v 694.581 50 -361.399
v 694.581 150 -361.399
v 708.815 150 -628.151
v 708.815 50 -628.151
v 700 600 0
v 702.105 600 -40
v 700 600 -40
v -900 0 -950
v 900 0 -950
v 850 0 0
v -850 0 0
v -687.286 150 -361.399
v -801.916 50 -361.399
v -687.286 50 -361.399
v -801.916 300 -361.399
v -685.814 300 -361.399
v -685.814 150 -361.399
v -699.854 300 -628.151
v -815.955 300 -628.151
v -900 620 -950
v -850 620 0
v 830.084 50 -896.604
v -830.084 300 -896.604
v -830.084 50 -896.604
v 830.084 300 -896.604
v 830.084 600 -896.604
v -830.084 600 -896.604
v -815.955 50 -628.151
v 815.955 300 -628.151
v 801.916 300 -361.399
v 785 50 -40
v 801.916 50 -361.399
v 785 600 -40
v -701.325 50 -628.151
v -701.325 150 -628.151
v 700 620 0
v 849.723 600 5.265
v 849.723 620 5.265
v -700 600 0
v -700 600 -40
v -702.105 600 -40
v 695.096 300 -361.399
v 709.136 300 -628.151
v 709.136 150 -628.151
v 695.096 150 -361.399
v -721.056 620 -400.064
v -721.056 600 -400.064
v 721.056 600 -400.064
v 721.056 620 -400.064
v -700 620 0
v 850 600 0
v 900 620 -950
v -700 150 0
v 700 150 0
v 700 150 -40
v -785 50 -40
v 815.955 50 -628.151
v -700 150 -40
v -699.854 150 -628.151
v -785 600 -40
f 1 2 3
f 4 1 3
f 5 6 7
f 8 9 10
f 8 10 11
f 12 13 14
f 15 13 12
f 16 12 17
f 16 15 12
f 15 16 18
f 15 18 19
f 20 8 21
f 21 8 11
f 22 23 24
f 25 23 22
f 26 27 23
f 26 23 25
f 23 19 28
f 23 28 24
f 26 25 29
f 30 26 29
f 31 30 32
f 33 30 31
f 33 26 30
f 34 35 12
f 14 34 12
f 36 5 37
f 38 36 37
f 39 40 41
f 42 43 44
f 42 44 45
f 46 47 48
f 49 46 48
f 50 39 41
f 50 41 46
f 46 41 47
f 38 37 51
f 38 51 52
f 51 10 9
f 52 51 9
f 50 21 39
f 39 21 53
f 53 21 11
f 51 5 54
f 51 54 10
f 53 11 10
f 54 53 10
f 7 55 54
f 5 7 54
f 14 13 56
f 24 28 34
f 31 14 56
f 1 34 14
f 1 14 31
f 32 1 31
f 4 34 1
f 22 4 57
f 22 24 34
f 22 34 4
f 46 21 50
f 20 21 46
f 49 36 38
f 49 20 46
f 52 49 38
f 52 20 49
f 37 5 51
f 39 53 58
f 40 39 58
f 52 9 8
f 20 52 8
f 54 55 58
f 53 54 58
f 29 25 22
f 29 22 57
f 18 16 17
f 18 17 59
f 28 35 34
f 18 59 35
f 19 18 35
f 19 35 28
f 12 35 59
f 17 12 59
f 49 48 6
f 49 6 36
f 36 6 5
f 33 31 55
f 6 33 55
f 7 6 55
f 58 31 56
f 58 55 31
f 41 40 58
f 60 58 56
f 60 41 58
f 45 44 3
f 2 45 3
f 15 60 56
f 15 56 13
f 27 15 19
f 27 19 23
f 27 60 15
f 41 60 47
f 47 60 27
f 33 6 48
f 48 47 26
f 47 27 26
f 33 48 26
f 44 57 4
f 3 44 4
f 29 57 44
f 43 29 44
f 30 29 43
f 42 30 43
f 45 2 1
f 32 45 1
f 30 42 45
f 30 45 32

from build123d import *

# Parameters (mm, degrees)
EXTRUDE_1_DEPTH          = 600
CUT_EXTRUDE_1_DEPTH      = 300
CUT_EXTRUDE_2_DEPTH      = 310
CUT_EXTRUDE_2_DEPTH_BACK = 150
CUT_EXTRUDE_3_DEPTH      = 100
EXTRUDE_2_DEPTH          = 20


with BuildPart() as part:
    # Эскиз1 → Бобышка-Вытянуть1 (new body)
    with BuildSketch(Plane(origin=(0, 0, 0), x_dir=(1, 0, 0), z_dir=(0, 1, 0))):
        Polygon((-900, 950), (900, 950), (850, 0), (-850, 0), align=None)
    extrude(amount=EXTRUDE_1_DEPTH)

    # Эскиз3 → Вырез-Вытянуть1 (cut)
    with BuildSketch(Plane(origin=(0, 600, 0), x_dir=(1, 0, 0), z_dir=(0, 1, 0))):
        Polygon((-830.084404496, 896.603685423), (830.084404496, 896.603685423), (785, 40), (-785, 40), align=None)
    extrude(amount=-CUT_EXTRUDE_1_DEPTH, mode=Mode.SUBTRACT)

    # Эскиз4 → Вырез-Вытянуть2 (cut, two sides)
    with BuildSketch(Plane(origin=(0, 300, 0), x_dir=(1, 0, 0), z_dir=(0, 1, 0))) as cut_extrude_2_sk:
        Polygon((-830.084404496, 896.603685423), (830.084404496, 896.603685423), (815.955318169, 628.151045218), (709.135748769, 628.151045218), (695.096165279, 361.398958916), (801.91573468, 361.398958916), (785, 40), (700, 40), (700, 0), (-700, 0), (-700, 40), (-785, 40), (-801.91573468, 361.398958916), (-685.814283751, 361.398958916), (-699.85386724, 628.151045218), (-815.955318169, 628.151045218), align=None)
    extrude(amount=CUT_EXTRUDE_2_DEPTH, mode=Mode.SUBTRACT)
    extrude(cut_extrude_2_sk.sketch, amount=-CUT_EXTRUDE_2_DEPTH_BACK, mode=Mode.SUBTRACT)

    # Эскиз5 → Вырез-Вытянуть3 (cut)
    with BuildSketch(Plane(origin=(0, 150, 0), x_dir=(1, 0, 0), z_dir=(0, 1, 0))):
        Polygon((-830.084404496, 896.603685423), (-815.955318169, 628.151045218), (-701.325281658, 628.151045218), (-687.285698169, 361.398958916), (-801.91573468, 361.398958916), (-785, 40), (785, 40), (801.91573468, 361.398958916), (694.58093137, 361.398958916), (708.814837931, 628.151045218), (815.955318169, 628.151045218), (830.084404496, 896.603685423), align=None)
    extrude(amount=-CUT_EXTRUDE_3_DEPTH, mode=Mode.SUBTRACT)

    # Эскиз6 → Бобышка-Вытянуть2 (add)
    with BuildSketch(Plane(origin=(0, 600, 0), x_dir=(1, 0, 0), z_dir=(0, 1, 0))):
        Polygon((-900, 950), (-850, 0), (-700, 0), (-721.056000817, 400.064015528), (721.056000817, 400.064015528), (700, 0), (849.722904554, -5.264813473), (900, 950), align=None)
    extrude(amount=EXTRUDE_2_DEPTH)


solid = part.part
